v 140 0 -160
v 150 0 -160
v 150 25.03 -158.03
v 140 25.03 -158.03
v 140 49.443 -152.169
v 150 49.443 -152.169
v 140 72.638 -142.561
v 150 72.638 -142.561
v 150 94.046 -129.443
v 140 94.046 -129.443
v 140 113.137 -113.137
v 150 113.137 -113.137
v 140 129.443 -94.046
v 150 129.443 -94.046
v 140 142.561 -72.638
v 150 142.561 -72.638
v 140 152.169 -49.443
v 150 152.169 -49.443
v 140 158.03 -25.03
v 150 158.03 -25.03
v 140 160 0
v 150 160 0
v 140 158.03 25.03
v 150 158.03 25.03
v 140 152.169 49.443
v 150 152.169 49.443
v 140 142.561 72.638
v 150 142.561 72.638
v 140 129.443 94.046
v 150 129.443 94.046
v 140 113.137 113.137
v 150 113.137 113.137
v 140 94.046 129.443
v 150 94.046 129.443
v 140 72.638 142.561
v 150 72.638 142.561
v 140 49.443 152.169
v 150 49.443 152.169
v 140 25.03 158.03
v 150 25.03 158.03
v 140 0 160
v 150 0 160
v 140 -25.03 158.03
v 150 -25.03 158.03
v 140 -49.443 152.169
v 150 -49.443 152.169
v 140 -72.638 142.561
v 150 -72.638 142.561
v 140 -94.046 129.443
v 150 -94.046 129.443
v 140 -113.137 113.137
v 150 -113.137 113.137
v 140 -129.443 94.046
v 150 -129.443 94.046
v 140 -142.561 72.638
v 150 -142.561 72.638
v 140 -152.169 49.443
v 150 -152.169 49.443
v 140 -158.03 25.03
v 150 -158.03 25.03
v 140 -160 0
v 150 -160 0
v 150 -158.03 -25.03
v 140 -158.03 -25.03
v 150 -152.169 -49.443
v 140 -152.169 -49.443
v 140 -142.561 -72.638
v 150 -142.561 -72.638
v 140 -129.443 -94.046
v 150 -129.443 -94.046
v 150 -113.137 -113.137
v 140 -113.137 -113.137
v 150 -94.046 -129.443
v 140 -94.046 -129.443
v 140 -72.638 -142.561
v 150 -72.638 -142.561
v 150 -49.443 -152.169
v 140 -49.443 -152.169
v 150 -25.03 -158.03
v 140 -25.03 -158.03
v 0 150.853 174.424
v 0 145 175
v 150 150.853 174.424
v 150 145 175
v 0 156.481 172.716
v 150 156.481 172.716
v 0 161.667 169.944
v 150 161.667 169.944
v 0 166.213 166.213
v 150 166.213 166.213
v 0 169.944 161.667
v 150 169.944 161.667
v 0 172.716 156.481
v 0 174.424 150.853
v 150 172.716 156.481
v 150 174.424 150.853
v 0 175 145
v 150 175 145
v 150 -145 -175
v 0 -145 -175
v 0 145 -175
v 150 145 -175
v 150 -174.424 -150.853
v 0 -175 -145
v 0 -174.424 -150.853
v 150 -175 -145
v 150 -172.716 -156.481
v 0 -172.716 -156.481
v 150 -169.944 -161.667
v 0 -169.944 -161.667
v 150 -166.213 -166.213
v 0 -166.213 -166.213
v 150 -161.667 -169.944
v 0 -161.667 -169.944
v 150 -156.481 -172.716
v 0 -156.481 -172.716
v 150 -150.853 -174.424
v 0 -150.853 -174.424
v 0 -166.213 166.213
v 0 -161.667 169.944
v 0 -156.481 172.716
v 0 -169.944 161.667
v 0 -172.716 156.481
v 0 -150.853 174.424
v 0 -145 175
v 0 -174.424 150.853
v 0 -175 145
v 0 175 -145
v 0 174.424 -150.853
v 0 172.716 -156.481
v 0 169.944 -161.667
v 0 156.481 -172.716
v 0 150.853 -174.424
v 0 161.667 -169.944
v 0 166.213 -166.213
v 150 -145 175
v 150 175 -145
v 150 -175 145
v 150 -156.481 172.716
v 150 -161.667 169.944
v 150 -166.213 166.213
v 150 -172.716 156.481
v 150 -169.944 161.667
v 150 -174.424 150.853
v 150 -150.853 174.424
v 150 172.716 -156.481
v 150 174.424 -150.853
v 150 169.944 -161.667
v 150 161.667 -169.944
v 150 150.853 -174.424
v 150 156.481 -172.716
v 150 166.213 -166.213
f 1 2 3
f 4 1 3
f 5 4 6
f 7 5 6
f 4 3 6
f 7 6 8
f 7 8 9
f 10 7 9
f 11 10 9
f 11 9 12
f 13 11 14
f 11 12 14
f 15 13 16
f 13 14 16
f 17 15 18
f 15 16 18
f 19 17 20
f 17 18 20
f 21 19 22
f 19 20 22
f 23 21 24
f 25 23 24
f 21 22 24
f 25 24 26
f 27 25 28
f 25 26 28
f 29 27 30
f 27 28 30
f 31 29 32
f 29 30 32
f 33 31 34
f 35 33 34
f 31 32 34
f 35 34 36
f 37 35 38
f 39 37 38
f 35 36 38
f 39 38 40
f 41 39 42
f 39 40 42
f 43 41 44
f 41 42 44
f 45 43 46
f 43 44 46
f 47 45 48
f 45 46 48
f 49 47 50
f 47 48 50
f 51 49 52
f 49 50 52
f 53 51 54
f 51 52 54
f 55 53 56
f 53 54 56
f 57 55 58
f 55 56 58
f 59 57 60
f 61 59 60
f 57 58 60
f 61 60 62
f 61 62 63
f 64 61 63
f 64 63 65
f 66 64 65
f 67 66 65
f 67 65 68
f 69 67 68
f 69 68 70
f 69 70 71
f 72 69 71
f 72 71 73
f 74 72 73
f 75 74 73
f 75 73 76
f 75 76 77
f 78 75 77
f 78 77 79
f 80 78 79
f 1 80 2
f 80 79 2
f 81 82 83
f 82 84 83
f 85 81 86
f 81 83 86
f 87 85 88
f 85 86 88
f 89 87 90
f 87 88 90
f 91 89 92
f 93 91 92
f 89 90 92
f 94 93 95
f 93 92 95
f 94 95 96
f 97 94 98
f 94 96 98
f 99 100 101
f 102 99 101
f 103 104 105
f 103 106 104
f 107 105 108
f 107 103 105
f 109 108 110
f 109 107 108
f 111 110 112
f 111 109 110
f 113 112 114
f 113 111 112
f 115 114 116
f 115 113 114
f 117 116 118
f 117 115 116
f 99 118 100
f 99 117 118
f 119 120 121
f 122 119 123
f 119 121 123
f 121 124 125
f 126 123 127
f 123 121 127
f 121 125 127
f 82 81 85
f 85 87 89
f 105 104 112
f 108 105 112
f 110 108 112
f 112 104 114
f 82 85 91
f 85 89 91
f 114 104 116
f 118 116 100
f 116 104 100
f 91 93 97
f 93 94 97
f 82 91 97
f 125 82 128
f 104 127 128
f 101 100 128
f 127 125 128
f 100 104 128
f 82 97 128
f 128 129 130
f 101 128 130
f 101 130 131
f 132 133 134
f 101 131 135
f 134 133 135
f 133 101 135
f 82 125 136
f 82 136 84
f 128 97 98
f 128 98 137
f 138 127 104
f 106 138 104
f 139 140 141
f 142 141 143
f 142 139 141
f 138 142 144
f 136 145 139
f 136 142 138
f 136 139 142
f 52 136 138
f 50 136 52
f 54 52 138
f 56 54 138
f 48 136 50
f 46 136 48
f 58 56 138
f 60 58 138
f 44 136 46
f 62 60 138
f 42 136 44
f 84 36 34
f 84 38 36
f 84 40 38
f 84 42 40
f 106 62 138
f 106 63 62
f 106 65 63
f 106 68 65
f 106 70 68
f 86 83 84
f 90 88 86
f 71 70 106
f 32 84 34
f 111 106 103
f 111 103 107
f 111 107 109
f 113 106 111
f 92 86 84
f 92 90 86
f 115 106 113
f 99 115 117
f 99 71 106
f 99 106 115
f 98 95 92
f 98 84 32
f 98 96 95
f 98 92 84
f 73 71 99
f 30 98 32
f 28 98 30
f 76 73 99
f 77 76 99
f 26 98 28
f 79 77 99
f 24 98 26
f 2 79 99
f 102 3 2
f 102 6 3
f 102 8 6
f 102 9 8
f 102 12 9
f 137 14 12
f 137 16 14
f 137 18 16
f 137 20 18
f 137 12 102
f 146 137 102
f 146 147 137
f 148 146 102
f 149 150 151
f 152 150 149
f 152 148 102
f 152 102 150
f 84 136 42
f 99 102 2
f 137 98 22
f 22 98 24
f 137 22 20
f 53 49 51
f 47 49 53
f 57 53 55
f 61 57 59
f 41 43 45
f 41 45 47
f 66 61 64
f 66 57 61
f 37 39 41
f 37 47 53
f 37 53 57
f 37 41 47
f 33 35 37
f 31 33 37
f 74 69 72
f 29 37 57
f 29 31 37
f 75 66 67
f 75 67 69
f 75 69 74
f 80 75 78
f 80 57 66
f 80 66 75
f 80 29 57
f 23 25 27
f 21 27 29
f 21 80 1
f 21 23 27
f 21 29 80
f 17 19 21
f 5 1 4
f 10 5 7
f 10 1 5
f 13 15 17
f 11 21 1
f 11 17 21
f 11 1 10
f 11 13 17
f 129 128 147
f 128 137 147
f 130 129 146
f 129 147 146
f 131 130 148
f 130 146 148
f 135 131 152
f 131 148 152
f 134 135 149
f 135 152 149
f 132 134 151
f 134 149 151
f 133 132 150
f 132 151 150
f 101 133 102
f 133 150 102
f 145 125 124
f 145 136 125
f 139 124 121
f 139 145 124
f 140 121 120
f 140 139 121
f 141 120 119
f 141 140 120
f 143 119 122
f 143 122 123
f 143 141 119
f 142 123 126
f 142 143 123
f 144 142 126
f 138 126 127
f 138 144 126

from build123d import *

# Parameters (mm, degrees)
IZIM1_W                     = 350
IZIM1_H                     = 350
Y_KSEKLIK_EKSTR_ZYON1_DEPTH = 150
IZIM2_R                     = 160
KES_EKSTR_ZYON1_DEPTH       = 10
RADYUS1_R                   = 30


with BuildPart() as part:
    # Çizim1 → Yükseklik-Ekstrüzyon1 (new body)
    with BuildSketch(Plane(origin=(0, 0, 0), x_dir=(0, 0, -1), z_dir=(1, 0, 0))):
        Rectangle(IZIM1_W, IZIM1_H)
    extrude(amount=Y_KSEKLIK_EKSTR_ZYON1_DEPTH)

    # Çizim2 → Kes-Ekstrüzyon1 (cut)
    with BuildSketch(Plane(origin=(150, 0, 0), x_dir=(0, 0, -1), z_dir=(1, 0, 0))):
        Circle(IZIM2_R)
    extrude(amount=-KES_EKSTR_ZYON1_DEPTH, mode=Mode.SUBTRACT)

    # Radyus1
    radyus1_edges = [part.edges().sort_by_distance(p)[0] for p in [
        (75, -175, -175),
        (75, -175, 175),
        (75, 175, 175),
        (75, 175, -175),
    ]]
    fillet(radyus1_edges, radius=RADYUS1_R)


solid = part.part
